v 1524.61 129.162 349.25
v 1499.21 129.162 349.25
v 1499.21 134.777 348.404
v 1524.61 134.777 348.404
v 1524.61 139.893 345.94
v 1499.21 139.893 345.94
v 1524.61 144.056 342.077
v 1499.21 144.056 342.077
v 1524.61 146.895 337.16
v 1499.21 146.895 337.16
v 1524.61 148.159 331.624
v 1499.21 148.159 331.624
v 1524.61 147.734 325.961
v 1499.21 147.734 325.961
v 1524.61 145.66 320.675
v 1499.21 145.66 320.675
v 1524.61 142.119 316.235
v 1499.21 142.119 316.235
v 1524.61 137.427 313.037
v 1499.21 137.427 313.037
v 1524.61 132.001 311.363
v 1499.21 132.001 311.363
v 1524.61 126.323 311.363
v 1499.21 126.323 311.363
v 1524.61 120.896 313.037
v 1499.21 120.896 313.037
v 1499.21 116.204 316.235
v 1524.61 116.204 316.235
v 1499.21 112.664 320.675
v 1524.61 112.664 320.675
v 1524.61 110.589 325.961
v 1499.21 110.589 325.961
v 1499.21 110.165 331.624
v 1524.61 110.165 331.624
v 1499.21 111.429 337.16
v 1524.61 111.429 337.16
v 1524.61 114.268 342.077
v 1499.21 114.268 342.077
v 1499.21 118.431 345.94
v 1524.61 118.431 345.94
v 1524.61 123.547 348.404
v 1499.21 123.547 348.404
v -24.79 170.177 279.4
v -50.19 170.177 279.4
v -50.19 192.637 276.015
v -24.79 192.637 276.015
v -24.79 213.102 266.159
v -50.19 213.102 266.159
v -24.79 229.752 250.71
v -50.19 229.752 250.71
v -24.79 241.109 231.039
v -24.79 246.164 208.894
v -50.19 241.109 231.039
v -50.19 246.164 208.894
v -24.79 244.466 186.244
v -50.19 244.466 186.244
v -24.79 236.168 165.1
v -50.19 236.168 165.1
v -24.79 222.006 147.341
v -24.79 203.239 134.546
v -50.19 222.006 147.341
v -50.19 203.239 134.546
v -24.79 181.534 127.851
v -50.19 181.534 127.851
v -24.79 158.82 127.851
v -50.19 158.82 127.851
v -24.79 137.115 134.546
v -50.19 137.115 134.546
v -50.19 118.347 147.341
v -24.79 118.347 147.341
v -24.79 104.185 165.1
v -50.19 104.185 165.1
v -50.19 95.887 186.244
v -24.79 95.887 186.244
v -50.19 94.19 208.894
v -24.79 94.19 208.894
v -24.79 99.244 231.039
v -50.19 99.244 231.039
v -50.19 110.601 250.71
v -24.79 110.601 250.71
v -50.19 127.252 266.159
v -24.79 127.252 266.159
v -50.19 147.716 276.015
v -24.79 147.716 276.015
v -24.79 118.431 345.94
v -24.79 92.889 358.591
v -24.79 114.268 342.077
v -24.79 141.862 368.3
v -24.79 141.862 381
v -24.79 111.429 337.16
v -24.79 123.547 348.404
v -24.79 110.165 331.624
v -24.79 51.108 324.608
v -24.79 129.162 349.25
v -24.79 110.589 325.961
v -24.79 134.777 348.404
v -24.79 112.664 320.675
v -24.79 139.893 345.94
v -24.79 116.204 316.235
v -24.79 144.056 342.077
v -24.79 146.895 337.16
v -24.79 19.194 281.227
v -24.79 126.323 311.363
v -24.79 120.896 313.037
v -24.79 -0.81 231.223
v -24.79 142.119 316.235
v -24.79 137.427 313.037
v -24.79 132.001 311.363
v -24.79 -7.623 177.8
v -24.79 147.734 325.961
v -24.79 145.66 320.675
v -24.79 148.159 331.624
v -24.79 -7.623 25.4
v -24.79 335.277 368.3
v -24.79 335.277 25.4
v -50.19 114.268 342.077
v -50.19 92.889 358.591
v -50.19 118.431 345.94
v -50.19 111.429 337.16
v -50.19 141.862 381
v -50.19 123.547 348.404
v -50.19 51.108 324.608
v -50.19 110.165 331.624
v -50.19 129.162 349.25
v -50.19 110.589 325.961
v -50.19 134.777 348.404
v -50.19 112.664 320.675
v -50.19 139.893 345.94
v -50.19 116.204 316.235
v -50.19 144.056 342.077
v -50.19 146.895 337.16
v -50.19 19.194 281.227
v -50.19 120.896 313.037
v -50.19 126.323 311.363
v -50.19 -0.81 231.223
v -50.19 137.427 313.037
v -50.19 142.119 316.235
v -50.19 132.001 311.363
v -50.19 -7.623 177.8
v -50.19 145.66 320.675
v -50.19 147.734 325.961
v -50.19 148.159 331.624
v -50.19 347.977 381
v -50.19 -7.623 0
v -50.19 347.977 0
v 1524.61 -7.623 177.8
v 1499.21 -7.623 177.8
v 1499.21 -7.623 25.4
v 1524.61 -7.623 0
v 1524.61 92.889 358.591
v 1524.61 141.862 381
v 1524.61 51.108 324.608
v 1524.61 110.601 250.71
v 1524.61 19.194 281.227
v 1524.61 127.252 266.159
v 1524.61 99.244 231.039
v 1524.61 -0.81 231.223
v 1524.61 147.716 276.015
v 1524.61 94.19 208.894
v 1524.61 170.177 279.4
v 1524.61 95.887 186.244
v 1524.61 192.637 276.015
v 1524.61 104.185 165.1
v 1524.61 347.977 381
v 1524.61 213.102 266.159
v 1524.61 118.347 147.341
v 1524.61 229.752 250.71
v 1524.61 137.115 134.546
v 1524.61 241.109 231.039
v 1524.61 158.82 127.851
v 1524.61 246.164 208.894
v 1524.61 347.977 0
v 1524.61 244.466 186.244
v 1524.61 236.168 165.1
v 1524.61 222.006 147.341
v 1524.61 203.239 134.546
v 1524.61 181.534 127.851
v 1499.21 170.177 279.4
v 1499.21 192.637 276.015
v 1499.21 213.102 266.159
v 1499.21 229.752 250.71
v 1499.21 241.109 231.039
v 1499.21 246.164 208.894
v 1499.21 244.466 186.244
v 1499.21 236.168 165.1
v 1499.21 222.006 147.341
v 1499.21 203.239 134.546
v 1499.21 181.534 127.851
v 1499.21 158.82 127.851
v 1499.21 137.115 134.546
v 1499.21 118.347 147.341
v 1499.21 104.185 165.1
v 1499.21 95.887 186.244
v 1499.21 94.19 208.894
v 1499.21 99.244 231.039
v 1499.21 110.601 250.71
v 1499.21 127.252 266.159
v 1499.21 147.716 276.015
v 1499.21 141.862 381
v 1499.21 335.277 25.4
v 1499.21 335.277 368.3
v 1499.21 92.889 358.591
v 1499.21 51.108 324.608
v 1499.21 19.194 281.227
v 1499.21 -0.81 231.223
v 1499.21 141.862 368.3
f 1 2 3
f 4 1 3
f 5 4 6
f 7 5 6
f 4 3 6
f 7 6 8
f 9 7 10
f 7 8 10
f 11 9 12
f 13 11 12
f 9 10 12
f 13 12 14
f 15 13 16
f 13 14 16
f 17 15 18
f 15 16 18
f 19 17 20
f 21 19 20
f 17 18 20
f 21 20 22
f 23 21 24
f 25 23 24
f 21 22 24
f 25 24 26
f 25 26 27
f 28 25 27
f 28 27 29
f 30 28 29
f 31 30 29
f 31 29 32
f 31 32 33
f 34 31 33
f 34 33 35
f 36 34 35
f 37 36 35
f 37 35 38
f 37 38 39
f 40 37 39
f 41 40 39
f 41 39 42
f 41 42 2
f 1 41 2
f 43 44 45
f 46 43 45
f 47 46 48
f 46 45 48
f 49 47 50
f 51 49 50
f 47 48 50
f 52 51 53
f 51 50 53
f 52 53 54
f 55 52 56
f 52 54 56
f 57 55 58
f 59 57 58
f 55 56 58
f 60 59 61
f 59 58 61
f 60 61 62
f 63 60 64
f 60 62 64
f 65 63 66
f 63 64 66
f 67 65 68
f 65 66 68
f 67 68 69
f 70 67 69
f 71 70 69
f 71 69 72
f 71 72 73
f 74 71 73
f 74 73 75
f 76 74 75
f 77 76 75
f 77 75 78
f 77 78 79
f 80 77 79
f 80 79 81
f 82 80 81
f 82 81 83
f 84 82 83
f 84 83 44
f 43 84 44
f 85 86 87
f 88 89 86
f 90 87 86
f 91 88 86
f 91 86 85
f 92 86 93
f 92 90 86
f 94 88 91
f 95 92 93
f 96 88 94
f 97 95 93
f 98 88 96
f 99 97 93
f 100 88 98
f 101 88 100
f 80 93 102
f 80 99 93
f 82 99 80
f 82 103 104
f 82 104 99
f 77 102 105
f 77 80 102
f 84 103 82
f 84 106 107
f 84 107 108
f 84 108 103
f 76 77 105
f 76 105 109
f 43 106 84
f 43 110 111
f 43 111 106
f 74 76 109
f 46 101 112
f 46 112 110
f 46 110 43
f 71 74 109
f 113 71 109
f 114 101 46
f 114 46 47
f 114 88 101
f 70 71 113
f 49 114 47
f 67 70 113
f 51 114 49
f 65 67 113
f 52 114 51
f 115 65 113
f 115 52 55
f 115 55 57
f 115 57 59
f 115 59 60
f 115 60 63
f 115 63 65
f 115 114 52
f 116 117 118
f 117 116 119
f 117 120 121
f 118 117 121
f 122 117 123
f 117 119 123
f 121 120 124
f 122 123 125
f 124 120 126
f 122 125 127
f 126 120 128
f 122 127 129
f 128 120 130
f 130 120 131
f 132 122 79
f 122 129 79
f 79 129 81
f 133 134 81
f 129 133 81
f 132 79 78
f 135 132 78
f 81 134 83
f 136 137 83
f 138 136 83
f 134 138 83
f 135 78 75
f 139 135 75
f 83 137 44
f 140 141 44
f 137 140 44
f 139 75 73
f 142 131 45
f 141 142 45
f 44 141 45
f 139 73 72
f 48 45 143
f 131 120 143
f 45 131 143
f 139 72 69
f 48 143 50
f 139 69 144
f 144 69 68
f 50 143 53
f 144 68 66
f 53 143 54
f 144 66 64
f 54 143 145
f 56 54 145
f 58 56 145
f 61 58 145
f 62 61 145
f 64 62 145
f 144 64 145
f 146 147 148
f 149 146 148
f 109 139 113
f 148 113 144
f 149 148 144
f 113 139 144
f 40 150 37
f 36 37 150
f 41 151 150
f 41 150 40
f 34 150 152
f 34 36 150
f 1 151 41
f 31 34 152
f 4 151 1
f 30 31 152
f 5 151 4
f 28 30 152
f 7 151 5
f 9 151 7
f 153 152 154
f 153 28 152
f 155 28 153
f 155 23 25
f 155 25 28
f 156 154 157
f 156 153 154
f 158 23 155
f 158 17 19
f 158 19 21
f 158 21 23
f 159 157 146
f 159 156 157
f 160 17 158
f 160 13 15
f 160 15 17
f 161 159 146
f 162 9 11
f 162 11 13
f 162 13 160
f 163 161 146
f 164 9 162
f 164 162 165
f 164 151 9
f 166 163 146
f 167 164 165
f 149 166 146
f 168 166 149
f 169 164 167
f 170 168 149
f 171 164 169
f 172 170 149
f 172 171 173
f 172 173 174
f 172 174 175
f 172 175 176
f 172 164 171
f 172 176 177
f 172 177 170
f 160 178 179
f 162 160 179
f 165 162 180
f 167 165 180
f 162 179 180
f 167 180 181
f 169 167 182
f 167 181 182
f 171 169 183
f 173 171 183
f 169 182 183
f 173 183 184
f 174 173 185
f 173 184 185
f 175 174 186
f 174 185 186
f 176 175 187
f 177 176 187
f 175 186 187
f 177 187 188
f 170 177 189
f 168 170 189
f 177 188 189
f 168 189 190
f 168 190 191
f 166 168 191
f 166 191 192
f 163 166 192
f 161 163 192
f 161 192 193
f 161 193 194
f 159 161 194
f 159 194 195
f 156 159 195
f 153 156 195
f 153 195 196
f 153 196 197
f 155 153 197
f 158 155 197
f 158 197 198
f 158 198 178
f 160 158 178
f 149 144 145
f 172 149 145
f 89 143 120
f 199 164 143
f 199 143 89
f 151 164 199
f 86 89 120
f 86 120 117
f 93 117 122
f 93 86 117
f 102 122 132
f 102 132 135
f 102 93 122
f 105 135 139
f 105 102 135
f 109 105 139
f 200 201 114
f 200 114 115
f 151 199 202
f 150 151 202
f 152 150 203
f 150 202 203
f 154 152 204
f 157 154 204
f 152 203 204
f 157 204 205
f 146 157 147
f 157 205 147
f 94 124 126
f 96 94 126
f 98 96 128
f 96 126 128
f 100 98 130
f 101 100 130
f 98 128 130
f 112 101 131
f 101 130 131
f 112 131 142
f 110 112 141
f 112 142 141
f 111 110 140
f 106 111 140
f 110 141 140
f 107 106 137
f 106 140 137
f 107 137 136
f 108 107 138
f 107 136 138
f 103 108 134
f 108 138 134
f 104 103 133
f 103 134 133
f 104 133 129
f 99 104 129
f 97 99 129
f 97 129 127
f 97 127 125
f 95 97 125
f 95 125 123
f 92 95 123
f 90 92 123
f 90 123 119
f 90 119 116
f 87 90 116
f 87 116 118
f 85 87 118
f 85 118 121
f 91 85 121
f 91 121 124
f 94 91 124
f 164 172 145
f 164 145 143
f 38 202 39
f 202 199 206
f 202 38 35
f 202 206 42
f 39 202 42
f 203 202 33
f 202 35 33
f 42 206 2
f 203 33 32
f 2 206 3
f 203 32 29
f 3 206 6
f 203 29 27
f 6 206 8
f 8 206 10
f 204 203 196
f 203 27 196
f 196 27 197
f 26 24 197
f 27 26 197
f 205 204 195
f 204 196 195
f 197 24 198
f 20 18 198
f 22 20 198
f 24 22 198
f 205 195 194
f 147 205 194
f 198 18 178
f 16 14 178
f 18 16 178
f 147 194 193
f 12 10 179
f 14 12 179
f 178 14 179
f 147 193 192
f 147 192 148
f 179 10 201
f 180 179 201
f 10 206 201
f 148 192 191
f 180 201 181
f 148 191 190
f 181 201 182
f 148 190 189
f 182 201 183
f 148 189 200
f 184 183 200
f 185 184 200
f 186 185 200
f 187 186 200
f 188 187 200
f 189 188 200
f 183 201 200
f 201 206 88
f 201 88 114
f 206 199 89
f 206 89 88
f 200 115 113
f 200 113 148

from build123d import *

# Parameters (mm, degrees)
SKETCH1_W           = 1524
SKETCH1_H           = 355.6
BOSS_EXTRUDE1_DEPTH = 25.4
BOSS_EXTRUDE5_DEPTH = 25.4
BOSS_EXTRUDE6_DEPTH = 762
SKETCH7_R           = 76.2
CUT_EXTRUDE1_DEPTH  = 1575.8
SKETCH8_R           = 19.05
CUT_EXTRUDE2_DEPTH  = 1575.8


with BuildPart() as part:
    # Sketch1 → Boss-Extrude1 (new body)
    with BuildSketch(Plane.XY):
        with Locations((737.21023766, 170.176599634)):
            Rectangle(SKETCH1_W, SKETCH1_H)
    extrude(amount=BOSS_EXTRUDE1_DEPTH)

    # Sketch5 → Boss-Extrude5 (add)
    with BuildSketch(Plane.ZY.offset(24.78976234)):
        with BuildLine():
            Line((0, 347.976599634), (381, 347.976599634))
            Line((381, 347.976599634), (381, 141.861776851))
            ThreePointArc((381, 141.861776851), (303.930942088, 33.773491198), (177.8, -7.623400366))
            Line((177.8, -7.623400366), (0, -7.623400366))
            Line((0, -7.623400366), (0, 347.976599634))
        make_face()
    boss_extrude5 = extrude(amount=BOSS_EXTRUDE5_DEPTH)

    # Sketch6 → Boss-Extrude6 (add)
    with BuildSketch(Plane(origin=(-24.78976234, 0, 0), x_dir=(0, 0, -1), z_dir=(1, 0, 0))):
        Polygon((-25.4, 347.976599634), (-381, 347.976599634), (-381, 141.861776851), (-368.3, 141.861776851), (-368.3, 335.276599634), (-25.4, 335.276599634), align=None)
    boss_extrude6 = extrude(amount=BOSS_EXTRUDE6_DEPTH)

    # Mirror2: Boss-Extrude5, Boss-Extrude6 across plane
    add(boss_extrude5.mirror(Plane(origin=(737.21023766, 0, 0), x_dir=(0, 0, 1), z_dir=(1, 0, 0))))
    add(boss_extrude6.mirror(Plane(origin=(737.21023766, 0, 0), x_dir=(0, 0, 1), z_dir=(1, 0, 0))))

    # Sketch7 → Cut-Extrude1 (cut, through all)
    with BuildSketch(Plane.ZY.offset(50.18976234)):
        with Locations((203.2, 170.176599634)):
            Circle(SKETCH7_R)
    extrude(amount=-CUT_EXTRUDE1_DEPTH, mode=Mode.SUBTRACT)

    # Sketch8 → Cut-Extrude2 (cut, through all)
    with BuildSketch(Plane.ZY.offset(50.18976234)):
        with Locations((330.2, 129.161776851)):
            Circle(SKETCH8_R)
    extrude(amount=-CUT_EXTRUDE2_DEPTH, mode=Mode.SUBTRACT)


solid = part.part
